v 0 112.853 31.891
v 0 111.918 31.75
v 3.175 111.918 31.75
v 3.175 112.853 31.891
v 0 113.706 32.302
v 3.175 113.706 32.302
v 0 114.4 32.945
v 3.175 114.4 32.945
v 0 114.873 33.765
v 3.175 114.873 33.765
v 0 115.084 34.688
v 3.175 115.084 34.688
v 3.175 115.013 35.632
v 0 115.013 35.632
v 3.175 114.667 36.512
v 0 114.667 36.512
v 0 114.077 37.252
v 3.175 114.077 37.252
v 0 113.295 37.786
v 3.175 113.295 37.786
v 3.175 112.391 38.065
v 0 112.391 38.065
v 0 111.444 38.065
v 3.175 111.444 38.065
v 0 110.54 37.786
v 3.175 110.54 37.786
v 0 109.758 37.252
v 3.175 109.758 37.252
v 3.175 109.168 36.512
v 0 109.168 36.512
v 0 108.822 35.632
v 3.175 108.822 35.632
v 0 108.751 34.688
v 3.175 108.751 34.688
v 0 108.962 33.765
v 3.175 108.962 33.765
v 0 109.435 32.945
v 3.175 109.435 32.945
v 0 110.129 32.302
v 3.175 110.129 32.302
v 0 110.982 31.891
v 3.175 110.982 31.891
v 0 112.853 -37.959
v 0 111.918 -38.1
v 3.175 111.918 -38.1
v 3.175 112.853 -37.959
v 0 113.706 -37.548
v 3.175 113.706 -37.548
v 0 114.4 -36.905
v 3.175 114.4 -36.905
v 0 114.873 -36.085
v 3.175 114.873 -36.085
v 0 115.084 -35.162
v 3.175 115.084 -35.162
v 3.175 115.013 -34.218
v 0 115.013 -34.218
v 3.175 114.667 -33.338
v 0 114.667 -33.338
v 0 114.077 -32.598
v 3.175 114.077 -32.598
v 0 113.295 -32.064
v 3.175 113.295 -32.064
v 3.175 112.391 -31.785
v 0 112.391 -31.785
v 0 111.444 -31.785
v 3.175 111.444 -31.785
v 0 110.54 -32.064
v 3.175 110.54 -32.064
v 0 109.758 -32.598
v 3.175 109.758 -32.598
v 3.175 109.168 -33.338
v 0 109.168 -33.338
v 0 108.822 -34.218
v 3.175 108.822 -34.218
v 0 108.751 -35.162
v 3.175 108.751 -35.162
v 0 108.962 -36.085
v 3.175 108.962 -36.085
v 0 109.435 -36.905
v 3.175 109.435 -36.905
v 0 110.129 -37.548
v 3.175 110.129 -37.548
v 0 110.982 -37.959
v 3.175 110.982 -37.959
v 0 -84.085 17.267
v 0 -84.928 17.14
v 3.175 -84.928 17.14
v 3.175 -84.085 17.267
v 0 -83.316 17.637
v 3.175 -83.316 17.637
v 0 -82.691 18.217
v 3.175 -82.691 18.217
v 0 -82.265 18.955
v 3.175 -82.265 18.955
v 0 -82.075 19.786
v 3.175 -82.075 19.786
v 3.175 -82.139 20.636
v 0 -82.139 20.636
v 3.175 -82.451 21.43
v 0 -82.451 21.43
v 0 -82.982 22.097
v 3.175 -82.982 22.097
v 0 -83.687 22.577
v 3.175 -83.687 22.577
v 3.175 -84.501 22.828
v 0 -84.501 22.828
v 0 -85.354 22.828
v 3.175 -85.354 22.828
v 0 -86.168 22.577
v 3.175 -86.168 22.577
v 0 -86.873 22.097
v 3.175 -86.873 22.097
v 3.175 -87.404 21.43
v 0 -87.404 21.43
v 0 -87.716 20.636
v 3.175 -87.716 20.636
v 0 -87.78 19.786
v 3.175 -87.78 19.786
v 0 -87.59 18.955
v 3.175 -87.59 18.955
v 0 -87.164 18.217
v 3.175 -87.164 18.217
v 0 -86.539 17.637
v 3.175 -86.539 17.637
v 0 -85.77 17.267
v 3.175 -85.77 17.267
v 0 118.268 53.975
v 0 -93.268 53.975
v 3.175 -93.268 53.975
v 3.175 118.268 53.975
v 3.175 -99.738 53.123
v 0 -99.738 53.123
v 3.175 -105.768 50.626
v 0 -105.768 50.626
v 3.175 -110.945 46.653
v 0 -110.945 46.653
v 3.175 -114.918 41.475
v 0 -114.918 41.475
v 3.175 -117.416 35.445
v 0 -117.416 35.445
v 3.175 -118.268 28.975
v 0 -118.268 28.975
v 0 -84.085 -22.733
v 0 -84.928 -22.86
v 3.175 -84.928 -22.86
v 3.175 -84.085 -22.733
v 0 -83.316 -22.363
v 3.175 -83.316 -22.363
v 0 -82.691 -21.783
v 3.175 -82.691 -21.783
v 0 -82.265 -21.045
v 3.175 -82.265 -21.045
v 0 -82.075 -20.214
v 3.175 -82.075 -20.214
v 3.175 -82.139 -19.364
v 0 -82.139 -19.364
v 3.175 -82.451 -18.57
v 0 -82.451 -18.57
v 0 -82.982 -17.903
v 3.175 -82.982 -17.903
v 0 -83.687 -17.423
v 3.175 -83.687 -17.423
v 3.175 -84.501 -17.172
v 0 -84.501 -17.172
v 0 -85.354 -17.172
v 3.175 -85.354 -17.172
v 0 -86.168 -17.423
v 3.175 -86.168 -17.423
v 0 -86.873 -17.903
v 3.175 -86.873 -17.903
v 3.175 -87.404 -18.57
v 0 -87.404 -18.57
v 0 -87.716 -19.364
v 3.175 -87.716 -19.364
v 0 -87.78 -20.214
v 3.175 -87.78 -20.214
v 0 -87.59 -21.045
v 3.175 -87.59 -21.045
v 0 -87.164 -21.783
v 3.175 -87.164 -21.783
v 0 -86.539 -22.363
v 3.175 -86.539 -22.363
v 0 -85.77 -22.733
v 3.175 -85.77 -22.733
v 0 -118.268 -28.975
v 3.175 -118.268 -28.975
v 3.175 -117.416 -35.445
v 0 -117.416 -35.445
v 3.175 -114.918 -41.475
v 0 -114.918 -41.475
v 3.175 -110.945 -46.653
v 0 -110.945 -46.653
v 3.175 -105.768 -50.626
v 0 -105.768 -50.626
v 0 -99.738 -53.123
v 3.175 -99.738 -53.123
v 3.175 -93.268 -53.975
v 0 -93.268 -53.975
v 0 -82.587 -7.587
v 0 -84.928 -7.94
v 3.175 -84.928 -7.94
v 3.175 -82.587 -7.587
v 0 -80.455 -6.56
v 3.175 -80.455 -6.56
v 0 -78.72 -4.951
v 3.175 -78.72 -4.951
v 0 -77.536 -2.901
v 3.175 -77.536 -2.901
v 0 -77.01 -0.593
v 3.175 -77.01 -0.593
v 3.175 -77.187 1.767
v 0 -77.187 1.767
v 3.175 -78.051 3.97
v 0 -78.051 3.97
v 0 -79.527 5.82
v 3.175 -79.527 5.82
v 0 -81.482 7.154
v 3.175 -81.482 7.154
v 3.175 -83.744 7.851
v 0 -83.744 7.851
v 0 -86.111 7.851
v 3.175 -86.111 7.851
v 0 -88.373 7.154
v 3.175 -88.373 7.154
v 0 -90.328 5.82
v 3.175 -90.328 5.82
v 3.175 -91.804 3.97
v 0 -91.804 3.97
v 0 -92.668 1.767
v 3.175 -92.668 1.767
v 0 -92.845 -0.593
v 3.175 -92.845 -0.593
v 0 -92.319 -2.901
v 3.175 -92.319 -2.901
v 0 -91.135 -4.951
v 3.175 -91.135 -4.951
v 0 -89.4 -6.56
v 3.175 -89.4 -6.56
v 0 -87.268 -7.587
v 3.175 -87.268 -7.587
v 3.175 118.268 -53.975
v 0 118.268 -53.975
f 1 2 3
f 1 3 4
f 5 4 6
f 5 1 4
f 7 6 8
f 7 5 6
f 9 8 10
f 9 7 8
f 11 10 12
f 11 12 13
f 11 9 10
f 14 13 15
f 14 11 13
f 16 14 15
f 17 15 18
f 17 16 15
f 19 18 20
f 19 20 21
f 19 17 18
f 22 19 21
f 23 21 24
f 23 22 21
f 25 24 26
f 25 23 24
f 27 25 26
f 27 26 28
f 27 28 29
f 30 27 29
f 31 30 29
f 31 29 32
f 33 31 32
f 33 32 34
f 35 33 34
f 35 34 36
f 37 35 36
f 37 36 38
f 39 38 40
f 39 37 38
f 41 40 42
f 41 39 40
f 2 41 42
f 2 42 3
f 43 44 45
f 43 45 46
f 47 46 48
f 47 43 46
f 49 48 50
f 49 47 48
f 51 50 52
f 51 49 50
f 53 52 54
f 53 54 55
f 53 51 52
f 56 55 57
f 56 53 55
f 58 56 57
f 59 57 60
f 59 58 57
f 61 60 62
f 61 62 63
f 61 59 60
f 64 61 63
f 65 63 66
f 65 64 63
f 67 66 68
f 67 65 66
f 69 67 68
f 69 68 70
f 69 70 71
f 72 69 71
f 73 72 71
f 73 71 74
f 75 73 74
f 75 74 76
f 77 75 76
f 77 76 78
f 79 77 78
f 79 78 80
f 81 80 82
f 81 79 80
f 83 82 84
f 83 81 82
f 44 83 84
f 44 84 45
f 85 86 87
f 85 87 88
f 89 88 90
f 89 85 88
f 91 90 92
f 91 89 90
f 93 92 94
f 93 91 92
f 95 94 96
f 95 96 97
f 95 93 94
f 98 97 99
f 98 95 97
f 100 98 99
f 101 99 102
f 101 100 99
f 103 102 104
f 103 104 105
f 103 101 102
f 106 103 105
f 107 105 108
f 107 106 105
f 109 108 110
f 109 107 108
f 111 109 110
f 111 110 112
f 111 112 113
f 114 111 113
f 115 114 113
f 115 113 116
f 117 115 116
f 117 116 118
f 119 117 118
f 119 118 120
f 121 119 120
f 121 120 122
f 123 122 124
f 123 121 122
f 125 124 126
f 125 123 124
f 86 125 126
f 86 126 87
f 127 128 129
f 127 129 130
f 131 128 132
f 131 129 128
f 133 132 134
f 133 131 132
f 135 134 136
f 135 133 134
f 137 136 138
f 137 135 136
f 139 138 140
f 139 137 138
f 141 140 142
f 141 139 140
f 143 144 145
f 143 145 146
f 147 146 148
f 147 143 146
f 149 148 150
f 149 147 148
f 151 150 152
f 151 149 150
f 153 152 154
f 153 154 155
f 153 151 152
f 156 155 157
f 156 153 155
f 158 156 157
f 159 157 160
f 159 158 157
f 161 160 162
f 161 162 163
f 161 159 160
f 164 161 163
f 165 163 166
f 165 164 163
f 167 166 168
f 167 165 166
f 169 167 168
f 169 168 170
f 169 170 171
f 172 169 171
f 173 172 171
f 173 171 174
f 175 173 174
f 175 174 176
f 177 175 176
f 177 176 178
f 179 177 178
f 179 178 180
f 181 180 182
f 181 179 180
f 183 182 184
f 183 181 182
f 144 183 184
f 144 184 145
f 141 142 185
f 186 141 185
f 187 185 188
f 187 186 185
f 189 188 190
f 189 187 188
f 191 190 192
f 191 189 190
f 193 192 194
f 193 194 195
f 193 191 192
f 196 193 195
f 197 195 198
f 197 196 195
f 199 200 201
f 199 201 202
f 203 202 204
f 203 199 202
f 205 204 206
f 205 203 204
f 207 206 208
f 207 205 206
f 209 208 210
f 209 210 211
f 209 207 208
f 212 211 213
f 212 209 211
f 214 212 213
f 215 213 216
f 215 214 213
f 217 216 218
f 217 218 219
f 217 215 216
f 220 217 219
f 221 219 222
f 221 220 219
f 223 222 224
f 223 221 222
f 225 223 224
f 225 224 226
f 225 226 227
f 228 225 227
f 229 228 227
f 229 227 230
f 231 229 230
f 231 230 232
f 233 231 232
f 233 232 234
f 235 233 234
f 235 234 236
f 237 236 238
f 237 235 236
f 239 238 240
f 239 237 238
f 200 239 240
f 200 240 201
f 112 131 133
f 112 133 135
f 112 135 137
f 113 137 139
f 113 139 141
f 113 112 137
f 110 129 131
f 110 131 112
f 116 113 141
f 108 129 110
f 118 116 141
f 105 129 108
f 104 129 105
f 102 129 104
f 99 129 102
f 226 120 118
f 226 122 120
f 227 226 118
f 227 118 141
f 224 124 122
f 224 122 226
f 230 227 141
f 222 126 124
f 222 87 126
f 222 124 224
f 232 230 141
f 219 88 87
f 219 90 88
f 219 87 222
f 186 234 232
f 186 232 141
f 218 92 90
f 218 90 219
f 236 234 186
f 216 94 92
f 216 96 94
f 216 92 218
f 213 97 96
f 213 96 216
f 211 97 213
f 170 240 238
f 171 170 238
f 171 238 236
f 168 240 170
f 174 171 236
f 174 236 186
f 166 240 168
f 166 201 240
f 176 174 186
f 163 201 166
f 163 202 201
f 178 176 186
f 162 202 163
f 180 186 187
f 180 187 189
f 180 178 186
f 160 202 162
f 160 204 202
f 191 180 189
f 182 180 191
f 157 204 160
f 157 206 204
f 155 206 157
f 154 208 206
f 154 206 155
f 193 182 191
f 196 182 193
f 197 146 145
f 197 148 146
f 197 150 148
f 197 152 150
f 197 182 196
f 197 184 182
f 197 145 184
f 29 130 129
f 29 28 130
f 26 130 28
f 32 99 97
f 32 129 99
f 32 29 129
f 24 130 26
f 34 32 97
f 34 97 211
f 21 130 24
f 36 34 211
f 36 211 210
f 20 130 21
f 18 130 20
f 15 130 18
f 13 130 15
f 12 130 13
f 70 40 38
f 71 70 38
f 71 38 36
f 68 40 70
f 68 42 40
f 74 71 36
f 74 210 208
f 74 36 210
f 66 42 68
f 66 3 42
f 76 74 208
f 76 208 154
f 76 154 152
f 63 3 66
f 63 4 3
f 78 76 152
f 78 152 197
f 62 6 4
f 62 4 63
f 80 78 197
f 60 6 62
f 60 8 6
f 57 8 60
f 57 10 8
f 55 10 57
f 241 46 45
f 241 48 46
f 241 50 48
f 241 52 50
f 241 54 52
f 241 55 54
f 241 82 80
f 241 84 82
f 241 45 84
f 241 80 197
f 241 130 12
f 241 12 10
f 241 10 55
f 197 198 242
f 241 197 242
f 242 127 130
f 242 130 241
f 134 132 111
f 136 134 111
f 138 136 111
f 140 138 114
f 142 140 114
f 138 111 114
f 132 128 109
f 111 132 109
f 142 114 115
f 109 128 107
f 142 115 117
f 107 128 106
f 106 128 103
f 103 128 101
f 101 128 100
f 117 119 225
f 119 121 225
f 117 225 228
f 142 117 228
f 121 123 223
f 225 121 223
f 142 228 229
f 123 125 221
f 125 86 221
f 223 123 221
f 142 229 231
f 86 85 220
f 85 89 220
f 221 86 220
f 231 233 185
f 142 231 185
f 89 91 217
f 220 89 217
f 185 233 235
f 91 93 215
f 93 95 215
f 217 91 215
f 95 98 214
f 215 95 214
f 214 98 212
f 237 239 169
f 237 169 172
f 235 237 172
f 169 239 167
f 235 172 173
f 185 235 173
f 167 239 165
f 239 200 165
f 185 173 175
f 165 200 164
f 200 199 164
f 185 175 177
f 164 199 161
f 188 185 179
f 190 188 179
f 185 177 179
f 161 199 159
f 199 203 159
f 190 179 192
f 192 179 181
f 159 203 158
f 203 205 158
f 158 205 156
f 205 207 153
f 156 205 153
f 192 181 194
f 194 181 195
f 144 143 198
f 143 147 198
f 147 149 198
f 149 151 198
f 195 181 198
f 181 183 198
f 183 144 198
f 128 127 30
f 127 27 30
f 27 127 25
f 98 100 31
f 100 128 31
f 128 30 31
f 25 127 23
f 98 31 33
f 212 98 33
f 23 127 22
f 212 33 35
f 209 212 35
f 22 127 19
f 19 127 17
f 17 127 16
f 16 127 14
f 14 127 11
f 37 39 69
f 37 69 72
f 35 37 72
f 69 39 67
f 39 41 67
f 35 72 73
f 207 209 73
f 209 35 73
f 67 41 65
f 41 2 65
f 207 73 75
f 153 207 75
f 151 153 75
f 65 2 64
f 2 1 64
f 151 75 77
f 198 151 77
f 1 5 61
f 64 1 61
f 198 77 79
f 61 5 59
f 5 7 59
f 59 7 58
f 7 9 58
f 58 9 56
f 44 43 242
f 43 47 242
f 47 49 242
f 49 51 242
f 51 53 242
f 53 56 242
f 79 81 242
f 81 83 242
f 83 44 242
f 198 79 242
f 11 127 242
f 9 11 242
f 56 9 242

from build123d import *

# Parameters (mm, degrees)
SKETCH1_W           = 107.95
SKETCH1_H           = 236.535
SKETCH1_R           = 7.94
SKETCH1_R_2         = 2.86
SKETCH1_R_3         = 3.175
BOSS_EXTRUDE1_DEPTH = 3.175
FILLET1_R           = 25


with BuildPart() as part:
    # Sketch1 → Boss-Extrude1 (new body)
    with BuildSketch(Plane(origin=(0, 0, 0), x_dir=(0, 0, -1), z_dir=(1, 0, 0))):
        Rectangle(SKETCH1_W, SKETCH1_H)
        with Locations((0, -84.9275)):
            Circle(SKETCH1_R, mode=Mode.SUBTRACT)
        with Locations((20, -84.9275)):
            Circle(SKETCH1_R_2, mode=Mode.SUBTRACT)
        with Locations((-20, -84.9275)):
            Circle(SKETCH1_R_2, mode=Mode.SUBTRACT)
        with Locations((-34.925, 111.9175)):
            Circle(SKETCH1_R_3, mode=Mode.SUBTRACT)
        with Locations((34.925, 111.9175)):
            Circle(SKETCH1_R_3, mode=Mode.SUBTRACT)
    extrude(amount=BOSS_EXTRUDE1_DEPTH)

    # Fillet1
    fillet1_edges = [part.edges().sort_by_distance(p)[0] for p in [
        (1.5875, -118.2675, -53.975),
        (1.5875, -118.2675, 53.975),
    ]]
    fillet(fillet1_edges, radius=FILLET1_R)


solid = part.part
